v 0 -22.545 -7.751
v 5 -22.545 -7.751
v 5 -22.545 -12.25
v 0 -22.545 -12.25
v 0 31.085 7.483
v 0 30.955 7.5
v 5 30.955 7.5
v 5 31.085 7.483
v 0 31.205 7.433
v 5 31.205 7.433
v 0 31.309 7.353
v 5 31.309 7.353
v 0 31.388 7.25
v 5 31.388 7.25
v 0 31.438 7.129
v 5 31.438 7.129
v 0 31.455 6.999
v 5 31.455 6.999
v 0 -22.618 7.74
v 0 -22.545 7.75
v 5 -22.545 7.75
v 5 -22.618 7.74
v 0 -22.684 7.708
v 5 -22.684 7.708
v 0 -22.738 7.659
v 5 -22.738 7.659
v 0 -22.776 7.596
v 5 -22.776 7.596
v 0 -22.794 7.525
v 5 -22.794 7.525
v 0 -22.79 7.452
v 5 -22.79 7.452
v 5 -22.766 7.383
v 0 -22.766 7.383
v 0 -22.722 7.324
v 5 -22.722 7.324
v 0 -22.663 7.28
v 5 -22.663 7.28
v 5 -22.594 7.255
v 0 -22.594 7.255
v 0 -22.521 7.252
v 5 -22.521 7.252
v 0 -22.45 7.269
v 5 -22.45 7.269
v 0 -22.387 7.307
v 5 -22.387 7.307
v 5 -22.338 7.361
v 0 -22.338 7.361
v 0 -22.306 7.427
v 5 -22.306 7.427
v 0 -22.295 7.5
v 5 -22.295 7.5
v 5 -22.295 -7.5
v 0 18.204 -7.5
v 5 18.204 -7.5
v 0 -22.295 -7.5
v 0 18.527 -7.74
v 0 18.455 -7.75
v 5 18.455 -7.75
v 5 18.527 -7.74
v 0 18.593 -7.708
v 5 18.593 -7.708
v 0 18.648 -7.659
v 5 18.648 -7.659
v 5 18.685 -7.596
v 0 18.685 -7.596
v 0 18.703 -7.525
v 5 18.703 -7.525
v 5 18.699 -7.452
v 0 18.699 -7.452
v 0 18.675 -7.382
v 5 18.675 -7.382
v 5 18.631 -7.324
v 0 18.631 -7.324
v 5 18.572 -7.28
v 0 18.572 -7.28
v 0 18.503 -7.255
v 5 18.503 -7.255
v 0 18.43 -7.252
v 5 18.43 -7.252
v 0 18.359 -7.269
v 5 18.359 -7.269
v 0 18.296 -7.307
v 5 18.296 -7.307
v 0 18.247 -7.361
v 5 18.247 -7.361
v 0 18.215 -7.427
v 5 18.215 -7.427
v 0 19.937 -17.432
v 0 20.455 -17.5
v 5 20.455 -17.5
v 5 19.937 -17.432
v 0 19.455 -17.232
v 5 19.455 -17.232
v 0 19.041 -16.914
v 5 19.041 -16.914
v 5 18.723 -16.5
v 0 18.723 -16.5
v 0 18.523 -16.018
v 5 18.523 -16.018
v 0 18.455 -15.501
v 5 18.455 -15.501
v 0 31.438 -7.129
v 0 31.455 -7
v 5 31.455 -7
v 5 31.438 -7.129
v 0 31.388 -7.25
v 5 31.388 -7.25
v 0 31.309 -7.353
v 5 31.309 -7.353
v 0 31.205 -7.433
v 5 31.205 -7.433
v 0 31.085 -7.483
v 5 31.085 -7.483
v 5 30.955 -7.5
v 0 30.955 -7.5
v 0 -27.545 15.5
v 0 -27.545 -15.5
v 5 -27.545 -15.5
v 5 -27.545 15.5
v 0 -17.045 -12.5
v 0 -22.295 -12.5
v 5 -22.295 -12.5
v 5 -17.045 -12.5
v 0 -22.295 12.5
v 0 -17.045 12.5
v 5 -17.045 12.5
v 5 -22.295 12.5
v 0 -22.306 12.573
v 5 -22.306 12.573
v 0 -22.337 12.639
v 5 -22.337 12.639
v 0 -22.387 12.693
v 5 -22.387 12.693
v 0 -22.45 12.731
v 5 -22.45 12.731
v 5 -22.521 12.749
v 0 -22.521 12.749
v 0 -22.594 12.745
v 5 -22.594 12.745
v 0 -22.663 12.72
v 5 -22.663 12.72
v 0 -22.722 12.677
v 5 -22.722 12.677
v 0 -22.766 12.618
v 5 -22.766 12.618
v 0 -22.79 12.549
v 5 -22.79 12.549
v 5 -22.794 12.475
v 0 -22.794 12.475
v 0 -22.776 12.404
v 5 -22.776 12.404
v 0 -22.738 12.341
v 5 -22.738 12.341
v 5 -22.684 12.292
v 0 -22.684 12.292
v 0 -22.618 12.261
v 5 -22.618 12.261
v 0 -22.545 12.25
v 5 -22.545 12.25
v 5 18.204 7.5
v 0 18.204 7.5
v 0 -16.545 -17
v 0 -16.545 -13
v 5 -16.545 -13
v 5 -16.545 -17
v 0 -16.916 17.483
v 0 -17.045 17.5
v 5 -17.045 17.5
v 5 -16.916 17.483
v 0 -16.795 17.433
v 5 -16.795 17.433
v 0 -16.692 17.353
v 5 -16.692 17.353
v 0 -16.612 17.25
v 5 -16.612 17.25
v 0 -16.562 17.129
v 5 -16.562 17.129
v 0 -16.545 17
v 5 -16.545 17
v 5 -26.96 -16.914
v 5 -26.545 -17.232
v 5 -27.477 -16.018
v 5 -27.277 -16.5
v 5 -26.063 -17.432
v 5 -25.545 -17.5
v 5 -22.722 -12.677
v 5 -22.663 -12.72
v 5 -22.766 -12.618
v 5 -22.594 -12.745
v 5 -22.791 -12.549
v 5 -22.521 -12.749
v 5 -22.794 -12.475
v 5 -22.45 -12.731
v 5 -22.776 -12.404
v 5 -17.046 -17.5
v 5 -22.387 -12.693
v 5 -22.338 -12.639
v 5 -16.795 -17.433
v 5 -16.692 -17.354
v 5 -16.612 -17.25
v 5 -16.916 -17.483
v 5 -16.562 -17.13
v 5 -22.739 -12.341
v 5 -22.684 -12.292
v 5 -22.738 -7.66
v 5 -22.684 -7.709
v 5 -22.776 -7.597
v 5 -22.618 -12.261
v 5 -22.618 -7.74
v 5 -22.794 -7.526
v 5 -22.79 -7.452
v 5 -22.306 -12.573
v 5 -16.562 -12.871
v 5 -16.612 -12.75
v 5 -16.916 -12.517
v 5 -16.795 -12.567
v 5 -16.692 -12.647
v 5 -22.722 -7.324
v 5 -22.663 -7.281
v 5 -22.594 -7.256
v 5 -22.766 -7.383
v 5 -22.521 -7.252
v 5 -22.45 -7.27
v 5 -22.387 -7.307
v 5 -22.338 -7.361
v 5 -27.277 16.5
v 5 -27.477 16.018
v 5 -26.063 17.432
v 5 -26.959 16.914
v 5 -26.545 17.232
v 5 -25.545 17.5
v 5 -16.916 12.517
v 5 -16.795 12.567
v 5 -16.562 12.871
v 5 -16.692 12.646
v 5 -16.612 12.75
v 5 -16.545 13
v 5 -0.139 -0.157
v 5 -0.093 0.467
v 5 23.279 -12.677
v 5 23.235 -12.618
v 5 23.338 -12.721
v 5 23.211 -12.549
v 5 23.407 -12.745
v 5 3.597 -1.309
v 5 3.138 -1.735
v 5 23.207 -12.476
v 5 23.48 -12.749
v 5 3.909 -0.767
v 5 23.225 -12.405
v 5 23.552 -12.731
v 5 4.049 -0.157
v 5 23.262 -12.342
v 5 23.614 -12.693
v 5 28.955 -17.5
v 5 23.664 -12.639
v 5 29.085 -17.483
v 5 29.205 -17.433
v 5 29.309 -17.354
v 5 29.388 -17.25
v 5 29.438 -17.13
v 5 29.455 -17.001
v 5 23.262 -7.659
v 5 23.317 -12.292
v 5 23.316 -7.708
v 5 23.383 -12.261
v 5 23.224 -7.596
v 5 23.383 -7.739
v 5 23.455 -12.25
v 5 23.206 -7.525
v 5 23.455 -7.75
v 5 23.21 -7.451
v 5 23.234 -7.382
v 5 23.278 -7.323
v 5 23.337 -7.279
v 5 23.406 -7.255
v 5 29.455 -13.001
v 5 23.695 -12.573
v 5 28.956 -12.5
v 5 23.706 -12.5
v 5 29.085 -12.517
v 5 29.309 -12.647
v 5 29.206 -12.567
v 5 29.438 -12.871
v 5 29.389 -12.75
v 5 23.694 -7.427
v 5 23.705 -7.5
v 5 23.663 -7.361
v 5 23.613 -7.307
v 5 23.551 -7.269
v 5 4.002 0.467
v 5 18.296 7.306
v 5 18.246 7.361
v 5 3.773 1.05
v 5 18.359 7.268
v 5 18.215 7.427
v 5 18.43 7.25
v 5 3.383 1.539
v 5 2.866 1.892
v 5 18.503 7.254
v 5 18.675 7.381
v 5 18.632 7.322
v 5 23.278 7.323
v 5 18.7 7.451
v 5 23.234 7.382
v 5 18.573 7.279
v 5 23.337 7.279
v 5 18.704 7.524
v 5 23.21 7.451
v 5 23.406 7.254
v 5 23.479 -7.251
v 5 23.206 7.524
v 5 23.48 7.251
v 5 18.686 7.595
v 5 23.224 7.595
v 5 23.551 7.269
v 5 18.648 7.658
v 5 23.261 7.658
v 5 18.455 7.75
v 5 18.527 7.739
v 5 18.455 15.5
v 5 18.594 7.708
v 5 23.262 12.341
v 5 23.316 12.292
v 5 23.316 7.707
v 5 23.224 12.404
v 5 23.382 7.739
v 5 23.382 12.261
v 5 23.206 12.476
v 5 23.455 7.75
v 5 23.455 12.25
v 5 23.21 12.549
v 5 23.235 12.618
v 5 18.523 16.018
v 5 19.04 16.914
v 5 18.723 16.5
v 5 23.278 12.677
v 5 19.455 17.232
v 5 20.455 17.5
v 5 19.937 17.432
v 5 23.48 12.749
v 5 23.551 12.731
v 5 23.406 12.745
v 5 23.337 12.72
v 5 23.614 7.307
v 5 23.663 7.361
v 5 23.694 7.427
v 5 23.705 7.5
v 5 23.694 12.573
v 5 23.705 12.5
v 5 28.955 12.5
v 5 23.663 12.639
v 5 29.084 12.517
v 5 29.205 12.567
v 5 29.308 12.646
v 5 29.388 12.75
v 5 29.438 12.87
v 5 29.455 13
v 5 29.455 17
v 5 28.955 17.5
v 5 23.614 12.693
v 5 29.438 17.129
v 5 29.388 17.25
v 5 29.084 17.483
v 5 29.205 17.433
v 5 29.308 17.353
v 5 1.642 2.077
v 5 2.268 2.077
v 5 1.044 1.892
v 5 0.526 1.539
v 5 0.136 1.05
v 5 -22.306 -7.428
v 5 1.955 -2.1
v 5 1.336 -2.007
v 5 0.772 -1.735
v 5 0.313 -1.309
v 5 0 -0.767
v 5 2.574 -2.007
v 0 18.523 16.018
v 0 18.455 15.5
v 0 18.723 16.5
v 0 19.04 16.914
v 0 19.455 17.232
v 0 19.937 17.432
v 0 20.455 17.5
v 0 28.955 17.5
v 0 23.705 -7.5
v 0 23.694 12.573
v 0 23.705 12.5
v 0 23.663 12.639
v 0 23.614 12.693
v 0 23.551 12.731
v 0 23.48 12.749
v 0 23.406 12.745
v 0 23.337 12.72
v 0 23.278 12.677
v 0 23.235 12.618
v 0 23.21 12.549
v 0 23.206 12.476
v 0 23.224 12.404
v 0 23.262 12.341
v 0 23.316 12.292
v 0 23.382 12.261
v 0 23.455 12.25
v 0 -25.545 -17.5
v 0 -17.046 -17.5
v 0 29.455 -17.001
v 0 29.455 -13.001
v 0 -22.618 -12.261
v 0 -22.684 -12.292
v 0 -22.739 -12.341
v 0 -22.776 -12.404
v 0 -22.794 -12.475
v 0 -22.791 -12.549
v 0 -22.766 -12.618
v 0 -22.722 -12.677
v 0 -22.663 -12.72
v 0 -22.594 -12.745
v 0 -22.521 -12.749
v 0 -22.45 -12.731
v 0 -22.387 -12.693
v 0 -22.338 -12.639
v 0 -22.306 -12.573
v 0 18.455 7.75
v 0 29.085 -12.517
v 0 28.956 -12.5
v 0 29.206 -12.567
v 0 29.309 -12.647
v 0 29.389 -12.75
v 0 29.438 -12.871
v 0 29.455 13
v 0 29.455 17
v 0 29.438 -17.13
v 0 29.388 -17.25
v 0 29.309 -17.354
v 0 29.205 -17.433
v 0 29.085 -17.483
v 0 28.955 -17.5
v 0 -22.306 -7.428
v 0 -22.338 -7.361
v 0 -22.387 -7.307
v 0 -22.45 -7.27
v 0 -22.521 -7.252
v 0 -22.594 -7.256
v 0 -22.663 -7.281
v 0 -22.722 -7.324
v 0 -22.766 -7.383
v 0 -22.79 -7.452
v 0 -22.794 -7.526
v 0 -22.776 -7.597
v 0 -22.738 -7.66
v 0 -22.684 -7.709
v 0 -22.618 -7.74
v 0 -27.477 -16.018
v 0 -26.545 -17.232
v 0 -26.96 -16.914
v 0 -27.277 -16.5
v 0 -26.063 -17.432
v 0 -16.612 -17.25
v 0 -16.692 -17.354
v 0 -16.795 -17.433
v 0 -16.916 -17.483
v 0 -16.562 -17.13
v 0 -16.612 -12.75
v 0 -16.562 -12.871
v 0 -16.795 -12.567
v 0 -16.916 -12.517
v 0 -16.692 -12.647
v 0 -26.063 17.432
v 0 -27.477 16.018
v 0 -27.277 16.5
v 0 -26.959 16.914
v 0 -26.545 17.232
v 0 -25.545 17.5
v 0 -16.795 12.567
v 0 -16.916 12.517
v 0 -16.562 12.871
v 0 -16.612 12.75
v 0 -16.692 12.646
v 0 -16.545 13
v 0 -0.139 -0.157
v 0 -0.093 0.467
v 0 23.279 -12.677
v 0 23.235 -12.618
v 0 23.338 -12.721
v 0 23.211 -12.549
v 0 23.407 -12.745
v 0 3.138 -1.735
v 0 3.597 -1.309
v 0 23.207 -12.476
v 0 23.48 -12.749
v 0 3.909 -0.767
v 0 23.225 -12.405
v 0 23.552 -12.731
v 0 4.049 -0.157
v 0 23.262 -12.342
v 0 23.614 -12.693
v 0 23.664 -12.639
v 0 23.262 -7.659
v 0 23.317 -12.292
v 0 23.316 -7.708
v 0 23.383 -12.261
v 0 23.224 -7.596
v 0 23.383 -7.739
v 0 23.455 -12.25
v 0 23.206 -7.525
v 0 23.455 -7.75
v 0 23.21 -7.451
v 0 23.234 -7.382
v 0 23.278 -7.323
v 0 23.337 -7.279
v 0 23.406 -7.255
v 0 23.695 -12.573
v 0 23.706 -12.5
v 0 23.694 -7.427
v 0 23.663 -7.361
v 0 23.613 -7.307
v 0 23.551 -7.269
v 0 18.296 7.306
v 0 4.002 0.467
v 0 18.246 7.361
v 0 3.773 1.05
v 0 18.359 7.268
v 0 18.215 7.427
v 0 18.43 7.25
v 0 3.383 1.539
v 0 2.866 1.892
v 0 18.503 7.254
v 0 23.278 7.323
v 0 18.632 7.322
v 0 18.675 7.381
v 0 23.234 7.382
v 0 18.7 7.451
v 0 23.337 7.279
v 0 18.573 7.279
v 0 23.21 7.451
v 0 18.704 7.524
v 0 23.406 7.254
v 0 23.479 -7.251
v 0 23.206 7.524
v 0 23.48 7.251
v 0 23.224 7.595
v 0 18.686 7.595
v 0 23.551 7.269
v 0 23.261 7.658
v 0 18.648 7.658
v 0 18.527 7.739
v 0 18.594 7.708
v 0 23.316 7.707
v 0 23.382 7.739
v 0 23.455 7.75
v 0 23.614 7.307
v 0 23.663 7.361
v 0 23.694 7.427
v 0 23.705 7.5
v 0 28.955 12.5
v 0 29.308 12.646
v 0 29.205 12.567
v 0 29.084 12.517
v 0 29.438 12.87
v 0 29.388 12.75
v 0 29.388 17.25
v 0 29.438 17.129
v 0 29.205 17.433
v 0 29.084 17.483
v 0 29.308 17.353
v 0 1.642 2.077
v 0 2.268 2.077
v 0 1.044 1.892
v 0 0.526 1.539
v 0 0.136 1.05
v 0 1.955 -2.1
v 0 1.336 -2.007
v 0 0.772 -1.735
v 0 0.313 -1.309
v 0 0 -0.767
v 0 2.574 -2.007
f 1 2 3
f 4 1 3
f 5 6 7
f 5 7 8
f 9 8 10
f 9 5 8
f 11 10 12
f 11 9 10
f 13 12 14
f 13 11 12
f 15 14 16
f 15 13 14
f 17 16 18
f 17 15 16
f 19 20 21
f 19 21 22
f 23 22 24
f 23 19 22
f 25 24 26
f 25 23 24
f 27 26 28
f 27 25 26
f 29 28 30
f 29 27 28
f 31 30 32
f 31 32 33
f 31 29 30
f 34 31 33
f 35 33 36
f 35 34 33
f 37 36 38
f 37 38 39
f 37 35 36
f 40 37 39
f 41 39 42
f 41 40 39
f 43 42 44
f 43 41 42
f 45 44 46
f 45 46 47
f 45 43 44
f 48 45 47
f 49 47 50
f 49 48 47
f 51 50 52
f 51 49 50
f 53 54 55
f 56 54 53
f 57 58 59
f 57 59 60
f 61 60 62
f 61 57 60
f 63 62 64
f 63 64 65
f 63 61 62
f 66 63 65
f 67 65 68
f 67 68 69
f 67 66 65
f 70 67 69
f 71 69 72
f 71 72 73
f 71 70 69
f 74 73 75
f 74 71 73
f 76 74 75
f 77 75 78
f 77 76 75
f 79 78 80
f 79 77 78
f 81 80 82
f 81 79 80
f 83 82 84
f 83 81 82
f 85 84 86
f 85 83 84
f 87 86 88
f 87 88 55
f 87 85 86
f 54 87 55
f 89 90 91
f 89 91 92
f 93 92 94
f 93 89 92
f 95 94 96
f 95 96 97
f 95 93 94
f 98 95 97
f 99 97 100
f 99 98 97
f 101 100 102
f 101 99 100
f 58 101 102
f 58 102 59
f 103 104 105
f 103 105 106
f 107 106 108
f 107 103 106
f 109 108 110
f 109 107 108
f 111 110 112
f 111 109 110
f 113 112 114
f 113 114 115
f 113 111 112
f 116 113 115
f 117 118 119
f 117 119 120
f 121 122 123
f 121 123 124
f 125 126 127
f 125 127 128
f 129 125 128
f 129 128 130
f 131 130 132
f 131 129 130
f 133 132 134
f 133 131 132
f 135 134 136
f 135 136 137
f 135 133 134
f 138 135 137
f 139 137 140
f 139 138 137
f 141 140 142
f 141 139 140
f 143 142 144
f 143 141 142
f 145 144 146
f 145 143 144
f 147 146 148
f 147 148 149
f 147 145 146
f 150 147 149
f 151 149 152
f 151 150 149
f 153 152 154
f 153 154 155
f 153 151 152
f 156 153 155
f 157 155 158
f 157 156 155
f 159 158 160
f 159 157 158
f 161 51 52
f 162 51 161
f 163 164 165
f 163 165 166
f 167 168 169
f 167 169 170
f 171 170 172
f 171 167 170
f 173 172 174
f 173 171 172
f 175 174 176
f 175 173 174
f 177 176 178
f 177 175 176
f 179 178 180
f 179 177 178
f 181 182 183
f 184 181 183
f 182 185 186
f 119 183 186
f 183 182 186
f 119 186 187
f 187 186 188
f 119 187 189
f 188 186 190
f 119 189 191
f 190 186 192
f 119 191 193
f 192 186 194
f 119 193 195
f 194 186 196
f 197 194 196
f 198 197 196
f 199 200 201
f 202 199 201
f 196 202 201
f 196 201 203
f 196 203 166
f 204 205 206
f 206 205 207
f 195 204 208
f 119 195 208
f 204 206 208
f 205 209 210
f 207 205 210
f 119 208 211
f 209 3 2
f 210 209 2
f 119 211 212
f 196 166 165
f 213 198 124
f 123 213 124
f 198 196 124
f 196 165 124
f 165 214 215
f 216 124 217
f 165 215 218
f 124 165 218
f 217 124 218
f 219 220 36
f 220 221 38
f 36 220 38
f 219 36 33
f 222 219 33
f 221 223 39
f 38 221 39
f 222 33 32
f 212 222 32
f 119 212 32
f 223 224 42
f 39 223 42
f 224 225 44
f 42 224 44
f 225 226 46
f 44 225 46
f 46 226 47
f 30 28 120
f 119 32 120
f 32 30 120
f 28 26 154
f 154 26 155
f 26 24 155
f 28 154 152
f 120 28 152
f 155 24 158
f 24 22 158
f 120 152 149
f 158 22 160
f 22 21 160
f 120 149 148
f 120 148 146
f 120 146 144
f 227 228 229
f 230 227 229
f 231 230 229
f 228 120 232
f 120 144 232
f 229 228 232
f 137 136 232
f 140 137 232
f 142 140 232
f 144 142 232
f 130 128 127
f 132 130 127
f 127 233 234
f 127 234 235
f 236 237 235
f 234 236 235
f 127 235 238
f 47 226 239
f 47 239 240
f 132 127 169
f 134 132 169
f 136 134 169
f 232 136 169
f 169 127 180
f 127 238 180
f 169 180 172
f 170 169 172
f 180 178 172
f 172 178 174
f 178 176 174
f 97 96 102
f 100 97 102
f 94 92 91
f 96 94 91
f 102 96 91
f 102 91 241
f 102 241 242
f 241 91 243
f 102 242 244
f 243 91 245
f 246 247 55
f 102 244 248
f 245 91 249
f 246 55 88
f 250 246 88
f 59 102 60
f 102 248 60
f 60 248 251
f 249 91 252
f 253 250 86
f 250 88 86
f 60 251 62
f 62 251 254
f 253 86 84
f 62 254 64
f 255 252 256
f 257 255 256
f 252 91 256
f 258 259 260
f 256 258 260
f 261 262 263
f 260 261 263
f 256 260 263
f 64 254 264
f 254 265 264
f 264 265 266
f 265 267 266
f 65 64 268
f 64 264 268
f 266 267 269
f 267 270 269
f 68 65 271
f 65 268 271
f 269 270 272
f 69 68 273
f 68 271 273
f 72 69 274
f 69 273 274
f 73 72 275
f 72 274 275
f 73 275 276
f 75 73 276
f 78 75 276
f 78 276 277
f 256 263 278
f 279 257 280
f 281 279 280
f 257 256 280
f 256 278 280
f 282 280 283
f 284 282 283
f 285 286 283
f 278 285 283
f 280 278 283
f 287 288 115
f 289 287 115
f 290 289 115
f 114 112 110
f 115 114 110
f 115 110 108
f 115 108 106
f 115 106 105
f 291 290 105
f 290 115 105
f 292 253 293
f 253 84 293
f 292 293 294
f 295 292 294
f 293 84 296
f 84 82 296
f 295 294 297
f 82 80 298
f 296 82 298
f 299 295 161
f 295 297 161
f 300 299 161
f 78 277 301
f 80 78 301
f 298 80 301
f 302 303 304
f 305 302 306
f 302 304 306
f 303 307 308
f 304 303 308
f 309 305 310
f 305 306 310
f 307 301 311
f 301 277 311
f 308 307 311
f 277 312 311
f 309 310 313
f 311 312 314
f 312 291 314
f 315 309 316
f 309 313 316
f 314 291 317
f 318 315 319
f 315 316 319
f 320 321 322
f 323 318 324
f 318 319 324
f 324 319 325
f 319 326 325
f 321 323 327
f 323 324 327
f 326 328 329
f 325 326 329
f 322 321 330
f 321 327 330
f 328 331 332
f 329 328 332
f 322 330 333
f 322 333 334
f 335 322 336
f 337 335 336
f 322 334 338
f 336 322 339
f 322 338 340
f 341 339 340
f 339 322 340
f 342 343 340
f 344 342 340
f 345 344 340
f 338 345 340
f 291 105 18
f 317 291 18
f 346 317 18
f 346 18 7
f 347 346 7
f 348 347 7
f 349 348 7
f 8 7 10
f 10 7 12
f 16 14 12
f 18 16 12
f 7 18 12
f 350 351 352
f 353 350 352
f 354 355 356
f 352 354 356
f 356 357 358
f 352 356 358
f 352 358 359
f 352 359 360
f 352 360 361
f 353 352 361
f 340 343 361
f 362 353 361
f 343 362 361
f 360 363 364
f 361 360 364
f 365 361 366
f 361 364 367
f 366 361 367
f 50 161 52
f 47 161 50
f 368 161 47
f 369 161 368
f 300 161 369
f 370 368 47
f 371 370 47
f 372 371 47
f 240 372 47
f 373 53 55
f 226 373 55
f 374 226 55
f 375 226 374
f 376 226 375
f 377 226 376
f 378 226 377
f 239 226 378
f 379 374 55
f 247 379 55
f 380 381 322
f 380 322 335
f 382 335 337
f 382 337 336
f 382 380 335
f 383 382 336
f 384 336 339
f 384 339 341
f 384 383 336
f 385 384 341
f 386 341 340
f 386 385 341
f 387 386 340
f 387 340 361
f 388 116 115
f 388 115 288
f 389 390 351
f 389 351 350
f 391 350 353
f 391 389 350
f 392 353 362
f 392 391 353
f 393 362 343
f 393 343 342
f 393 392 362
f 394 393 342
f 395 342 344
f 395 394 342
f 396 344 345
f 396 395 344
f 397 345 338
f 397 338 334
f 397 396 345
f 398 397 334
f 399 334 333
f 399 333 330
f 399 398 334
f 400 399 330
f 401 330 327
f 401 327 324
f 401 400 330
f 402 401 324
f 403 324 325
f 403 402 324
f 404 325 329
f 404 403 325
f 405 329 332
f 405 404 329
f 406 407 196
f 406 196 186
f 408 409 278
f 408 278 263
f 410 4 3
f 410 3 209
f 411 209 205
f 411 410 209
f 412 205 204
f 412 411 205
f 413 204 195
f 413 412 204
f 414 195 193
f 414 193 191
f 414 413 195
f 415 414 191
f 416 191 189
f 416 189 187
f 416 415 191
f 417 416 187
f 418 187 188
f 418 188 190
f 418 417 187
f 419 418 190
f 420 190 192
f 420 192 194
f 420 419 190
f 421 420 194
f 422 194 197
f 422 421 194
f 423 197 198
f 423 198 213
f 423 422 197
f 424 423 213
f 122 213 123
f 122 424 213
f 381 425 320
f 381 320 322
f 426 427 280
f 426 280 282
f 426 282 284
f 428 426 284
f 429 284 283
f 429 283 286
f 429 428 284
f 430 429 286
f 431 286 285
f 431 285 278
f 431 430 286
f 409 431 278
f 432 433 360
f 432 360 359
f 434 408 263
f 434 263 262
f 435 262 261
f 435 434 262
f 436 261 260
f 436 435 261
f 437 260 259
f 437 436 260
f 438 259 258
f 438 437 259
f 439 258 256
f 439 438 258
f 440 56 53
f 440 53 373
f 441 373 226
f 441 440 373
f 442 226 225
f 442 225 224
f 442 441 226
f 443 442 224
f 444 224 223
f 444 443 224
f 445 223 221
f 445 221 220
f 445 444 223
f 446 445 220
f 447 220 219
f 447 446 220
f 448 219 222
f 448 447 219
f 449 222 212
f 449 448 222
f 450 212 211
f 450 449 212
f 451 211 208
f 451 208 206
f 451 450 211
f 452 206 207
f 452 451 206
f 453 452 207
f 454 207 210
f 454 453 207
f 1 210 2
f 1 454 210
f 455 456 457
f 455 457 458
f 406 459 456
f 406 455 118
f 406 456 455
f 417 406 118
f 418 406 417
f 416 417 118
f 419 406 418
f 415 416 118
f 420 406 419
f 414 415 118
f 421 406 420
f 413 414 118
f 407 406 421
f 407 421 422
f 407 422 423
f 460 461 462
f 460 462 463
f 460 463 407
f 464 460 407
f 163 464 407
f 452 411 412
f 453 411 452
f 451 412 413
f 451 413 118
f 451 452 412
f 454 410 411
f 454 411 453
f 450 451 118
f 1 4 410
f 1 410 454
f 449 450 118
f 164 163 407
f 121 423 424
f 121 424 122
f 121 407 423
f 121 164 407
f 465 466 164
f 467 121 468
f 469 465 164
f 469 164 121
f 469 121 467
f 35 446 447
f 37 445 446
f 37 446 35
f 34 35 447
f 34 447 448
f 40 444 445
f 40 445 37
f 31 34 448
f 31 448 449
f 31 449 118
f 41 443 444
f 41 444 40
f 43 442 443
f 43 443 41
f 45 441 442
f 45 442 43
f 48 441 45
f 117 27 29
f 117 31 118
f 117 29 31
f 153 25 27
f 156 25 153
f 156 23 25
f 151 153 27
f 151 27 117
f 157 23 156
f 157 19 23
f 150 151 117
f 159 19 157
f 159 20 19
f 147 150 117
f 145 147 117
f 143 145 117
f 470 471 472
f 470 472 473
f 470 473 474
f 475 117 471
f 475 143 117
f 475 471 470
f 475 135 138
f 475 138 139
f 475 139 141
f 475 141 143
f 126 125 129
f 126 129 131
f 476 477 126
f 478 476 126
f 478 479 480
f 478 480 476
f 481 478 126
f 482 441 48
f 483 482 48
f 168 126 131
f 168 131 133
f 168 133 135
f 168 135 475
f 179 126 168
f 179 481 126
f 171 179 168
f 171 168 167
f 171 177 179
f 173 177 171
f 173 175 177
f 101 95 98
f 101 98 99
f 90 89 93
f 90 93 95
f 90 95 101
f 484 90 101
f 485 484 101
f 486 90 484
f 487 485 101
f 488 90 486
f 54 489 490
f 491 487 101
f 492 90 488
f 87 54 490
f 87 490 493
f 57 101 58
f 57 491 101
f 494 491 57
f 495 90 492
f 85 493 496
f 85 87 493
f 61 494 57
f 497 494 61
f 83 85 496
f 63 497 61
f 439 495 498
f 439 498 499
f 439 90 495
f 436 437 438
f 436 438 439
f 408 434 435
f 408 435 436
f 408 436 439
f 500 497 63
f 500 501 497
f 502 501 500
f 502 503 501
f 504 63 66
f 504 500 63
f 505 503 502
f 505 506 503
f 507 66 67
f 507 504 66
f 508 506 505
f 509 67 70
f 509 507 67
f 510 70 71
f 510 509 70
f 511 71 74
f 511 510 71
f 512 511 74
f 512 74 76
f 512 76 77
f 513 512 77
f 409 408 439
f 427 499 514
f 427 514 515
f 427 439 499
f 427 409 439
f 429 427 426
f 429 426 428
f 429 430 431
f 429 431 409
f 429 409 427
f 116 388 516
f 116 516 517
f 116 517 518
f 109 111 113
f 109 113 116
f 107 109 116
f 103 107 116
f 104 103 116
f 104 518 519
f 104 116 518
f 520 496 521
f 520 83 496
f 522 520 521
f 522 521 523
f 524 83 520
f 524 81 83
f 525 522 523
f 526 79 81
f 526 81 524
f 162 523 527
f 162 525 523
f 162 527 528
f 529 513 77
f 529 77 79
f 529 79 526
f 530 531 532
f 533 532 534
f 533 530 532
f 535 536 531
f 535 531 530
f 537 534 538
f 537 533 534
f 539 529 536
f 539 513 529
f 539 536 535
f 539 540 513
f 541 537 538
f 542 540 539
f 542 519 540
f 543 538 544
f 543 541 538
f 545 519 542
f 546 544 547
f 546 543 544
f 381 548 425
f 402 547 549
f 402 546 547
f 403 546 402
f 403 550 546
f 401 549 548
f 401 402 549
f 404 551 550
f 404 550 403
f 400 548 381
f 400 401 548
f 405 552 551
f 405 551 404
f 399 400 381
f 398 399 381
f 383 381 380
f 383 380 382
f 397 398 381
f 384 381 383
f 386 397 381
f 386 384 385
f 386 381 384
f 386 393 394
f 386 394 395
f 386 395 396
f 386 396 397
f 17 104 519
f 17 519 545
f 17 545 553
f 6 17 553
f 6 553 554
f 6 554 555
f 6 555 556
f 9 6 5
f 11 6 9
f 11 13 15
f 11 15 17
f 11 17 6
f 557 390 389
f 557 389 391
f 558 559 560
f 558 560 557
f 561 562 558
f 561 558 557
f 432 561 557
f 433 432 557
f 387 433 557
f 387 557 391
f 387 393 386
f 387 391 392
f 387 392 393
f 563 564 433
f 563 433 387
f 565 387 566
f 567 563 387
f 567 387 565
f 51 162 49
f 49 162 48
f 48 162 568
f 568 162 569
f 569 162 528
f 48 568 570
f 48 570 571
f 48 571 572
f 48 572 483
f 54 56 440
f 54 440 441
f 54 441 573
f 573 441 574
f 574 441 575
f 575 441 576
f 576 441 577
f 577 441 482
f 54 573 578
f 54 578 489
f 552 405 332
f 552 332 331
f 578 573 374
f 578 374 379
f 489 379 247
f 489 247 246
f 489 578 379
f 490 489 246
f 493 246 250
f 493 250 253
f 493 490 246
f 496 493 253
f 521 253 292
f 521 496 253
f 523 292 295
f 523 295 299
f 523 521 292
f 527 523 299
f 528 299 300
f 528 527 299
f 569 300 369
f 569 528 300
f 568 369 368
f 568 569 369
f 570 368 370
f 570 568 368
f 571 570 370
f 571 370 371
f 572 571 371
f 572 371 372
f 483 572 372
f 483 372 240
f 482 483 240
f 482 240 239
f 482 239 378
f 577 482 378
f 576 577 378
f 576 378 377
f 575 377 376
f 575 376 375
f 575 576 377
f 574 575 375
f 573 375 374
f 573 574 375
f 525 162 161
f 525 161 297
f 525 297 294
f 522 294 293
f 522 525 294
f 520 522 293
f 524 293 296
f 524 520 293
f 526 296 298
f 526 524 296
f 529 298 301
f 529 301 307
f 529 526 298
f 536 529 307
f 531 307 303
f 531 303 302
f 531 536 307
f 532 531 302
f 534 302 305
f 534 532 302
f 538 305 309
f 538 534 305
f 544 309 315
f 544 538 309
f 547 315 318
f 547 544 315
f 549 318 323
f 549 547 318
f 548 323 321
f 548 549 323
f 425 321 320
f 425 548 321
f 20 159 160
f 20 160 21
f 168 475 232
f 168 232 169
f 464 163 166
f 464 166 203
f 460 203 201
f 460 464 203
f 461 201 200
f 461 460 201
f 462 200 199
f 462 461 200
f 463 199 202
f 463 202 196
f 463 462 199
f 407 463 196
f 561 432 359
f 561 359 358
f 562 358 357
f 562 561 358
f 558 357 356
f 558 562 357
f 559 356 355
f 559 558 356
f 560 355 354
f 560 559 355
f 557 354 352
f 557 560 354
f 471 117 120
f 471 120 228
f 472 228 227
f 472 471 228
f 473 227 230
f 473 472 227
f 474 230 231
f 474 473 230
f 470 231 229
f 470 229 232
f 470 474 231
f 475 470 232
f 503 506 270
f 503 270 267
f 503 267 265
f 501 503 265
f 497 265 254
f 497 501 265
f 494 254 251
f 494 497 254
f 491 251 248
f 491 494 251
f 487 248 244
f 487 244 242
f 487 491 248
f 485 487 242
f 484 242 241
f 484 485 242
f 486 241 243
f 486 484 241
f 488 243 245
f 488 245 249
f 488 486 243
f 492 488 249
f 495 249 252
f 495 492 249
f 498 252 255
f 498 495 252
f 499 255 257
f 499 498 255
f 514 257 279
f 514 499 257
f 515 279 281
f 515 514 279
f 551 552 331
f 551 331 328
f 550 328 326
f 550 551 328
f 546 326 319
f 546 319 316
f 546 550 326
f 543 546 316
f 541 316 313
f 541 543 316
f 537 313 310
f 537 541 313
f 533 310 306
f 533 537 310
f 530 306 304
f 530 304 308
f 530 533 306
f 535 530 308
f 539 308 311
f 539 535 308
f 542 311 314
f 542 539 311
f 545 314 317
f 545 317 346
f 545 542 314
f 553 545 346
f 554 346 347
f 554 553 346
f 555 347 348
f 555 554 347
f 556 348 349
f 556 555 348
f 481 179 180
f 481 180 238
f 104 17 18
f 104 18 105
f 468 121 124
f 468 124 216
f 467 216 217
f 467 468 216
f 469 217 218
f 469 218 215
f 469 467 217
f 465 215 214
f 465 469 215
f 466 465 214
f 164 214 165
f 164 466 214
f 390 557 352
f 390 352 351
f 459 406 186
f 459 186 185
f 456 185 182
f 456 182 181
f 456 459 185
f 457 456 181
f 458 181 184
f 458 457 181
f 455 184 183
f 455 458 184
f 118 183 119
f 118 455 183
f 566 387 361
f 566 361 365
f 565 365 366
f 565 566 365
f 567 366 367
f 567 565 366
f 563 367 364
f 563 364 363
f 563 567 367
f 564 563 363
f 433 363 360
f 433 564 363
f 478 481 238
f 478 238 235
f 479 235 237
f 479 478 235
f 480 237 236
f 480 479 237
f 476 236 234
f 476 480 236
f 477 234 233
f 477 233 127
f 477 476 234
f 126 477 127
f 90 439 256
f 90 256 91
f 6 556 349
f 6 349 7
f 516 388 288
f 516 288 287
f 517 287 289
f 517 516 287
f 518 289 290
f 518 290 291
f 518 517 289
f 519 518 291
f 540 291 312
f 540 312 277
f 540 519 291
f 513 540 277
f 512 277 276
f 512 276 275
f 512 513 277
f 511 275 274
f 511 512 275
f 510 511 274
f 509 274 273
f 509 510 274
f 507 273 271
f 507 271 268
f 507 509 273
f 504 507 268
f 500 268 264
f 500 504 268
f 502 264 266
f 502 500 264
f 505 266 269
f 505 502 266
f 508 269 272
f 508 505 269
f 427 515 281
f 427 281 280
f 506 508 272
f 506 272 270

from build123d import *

# Parameters (mm, degrees)
ESQUISSE2_R        = 2.1
BOSS_EXTRU_2_DEPTH = 5


with BuildPart() as part:
    # Esquisse2 → Boss.-Extru.2 (new body)
    with BuildSketch(Plane(origin=(0, 0, 0), x_dir=(0, 0, -1), z_dir=(1, 0, 0))):
        with BuildLine():
            Line((7.750863413, -22.545340393), (12.249833074, -22.545340393))
            ThreePointArc((12.249833074, -22.545340393), (12.676550763, -22.722176075), (12.499999941, -22.295340449))
            Line((12.499999941, -22.295340449), (12.499999941, -17.045209493))
            ThreePointArc((12.499999941, -17.045209493), (12.646553376, -16.691549218), (13.000302135, -16.545209493))
            Line((13.000302135, -16.545209493), (17.000089808, -16.545209493))
            ThreePointArc((17.000089808, -16.545209493), (17.353706499, -16.69180921), (17.499999941, -17.04555272))
            Line((17.499999941, -17.04555272), (17.499999941, -25.545209493))
            ThreePointArc((17.499999941, -25.545209493), (16.9143288, -26.959538351), (15.499999941, -27.545209493))
            Line((15.499999941, -27.545209493), (-15.500000059, -27.545209493))
            ThreePointArc((-15.500000059, -27.545209493), (-16.914213621, -26.959423055), (-17.500000059, -25.545209493))
            Line((-17.500000059, -25.545209493), (-17.500000059, -17.04542182))
            ThreePointArc((-17.500000059, -17.04542182), (-17.35349126, -16.691718292), (-16.999787732, -16.545209493))
            Line((-16.999787732, -16.545209493), (-13.000000059, -16.545209493))
            ThreePointArc((-13.000000059, -16.545209493), (-12.646446668, -16.691656102), (-12.500000059, -17.045209493))
            Line((-12.500000059, -17.045209493), (-12.500000059, -22.295209493))
            ThreePointArc((-12.500000059, -22.295209493), (-12.676776754, -22.721986188), (-12.250000059, -22.545209493))
            Line((-12.250000059, -22.545209493), (-7.750394504, -22.545209493))
            ThreePointArc((-7.750394504, -22.545209493), (-7.32375732, -22.722125589), (-7.500000059, -22.295209803))
            Line((-7.500000059, -22.295209803), (-7.500000059, 18.204252682))
            ThreePointArc((-7.500000059, 18.204252682), (-7.322400285, 18.631591193), (-7.750017362, 18.454663189))
            Line((-7.750017362, 18.454663189), (-15.500000059, 18.454663189))
            ThreePointArc((-15.500000059, 18.454663189), (-16.914213621, 19.040449627), (-17.500000059, 20.454663189))
            Line((-17.500000059, 20.454663189), (-17.500000059, 28.954790507))
            ThreePointArc((-17.500000059, 28.954790507), (-17.353414349, 29.308483098), (-16.999606545, 29.454790507))
            Line((-16.999606545, 29.454790507), (-12.999606545, 29.454790507))
            ThreePointArc((-12.999606545, 29.454790507), (-12.646446514, 29.308344052), (-12.500000059, 28.955184021))
            Line((-12.500000059, 28.955184021), (-12.500000059, 23.705183903))
            ThreePointArc((-12.500000059, 23.705183903), (-12.676711319, 23.278492956), (-12.249849272, 23.454790507))
            Line((-12.249849272, 23.454790507), (-7.749606545, 23.454790507))
            ThreePointArc((-7.749606545, 23.454790507), (-7.322690777, 23.278152995), (-7.500000059, 23.704790197))
            Line((-7.500000059, 23.704790197), (-7.500000059, 30.955184021))
            ThreePointArc((-7.500000059, 30.955184021), (-7.353221822, 31.308675666), (-6.999455449, 31.454790507))
            Line((-6.999455449, 31.454790507), (6.999757524, 31.454790507))
            ThreePointArc((6.999757524, 31.454790507), (7.353328546, 31.308568754), (7.499999941, 30.955184021))
            Line((7.499999941, 30.955184021), (7.499999941, 23.704790197))
            ThreePointArc((7.499999941, 23.704790197), (7.323085388, 23.277909123), (7.749756946, 23.455328378))
            Line((7.749756946, 23.455328378), (12.250151348, 23.455328378))
            ThreePointArc((12.250151348, 23.455328378), (12.677119893, 23.279136755), (12.499999941, 23.705721037))
            Line((12.499999941, 23.705721037), (12.499999941, 28.955721891))
            ThreePointArc((12.499999941, 28.955721891), (12.646778178, 29.309213536), (13.00054455, 29.455328378))
            Line((13.00054455, 29.455328378), (17.00054455, 29.455328378))
            ThreePointArc((17.00054455, 29.455328378), (17.353745932, 29.308689359), (17.499999941, 28.955328378))
            Line((17.499999941, 28.955328378), (17.499999941, 20.454659607))
            ThreePointArc((17.499999941, 20.454659607), (16.914406065, 19.040638558), (15.50054455, 18.454659607))
            Line((15.50054455, 18.454659607), (7.75039284, 18.454659607))
            ThreePointArc((7.75039284, 18.454659607), (7.323611584, 18.631024058), (7.499999941, 18.204252682))
            Line((7.499999941, 18.204252682), (7.499999941, -22.295209803))
            ThreePointArc((7.499999941, -22.295209803), (7.32434554, -22.722243416), (7.750863413, -22.545340393))
        make_face()
        with Locations((-5.9e-08, 1.954659607)):
            Circle(ESQUISSE2_R, mode=Mode.SUBTRACT)
    extrude(amount=BOSS_EXTRU_2_DEPTH)


solid = part.part
